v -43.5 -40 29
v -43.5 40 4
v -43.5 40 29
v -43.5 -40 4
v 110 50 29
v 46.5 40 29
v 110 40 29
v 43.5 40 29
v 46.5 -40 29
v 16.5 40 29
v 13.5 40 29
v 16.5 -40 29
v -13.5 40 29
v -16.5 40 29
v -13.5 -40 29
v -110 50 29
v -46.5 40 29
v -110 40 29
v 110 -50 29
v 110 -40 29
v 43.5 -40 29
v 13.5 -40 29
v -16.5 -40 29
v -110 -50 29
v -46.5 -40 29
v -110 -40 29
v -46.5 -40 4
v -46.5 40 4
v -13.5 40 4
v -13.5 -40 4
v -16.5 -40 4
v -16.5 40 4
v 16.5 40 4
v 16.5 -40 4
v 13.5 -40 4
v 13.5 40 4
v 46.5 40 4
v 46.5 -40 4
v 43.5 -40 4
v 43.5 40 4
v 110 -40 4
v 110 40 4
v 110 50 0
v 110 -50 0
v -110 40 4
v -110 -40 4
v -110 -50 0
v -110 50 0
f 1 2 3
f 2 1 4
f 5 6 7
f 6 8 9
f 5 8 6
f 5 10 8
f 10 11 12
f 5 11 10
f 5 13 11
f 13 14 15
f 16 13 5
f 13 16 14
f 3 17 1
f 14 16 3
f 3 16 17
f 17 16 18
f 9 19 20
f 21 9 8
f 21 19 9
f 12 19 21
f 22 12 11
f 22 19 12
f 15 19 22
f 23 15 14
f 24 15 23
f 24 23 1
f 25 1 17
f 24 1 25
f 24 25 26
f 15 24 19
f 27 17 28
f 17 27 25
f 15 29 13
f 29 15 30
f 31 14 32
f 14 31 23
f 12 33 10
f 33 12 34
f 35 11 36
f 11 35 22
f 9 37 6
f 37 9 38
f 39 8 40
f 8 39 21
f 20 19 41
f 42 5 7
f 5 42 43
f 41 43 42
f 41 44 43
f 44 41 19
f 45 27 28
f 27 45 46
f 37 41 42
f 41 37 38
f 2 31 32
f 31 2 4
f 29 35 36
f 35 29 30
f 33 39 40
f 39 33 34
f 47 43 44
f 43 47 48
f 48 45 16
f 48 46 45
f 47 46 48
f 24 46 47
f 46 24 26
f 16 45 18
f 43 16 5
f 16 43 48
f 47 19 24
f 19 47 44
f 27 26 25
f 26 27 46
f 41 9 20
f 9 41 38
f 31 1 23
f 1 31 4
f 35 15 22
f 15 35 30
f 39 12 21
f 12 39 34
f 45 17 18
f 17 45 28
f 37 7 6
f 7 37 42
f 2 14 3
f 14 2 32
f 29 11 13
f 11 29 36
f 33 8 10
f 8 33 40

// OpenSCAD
$fn = 32;

// ----------------------------------------------------------------------
// Rib frame 220 x 100 x 29
// 4 ribs at 30 mm pitch
// ----------------------------------------------------------------------

// --- parameters (mm) ---
frame = [220, 100, 4];  // base plate size (x, y, z)
rail_w = 10;            // side rail width
ribs = 4;               // number of ribs
rib_t = 3;              // rib thickness
rib_h = 25;             // rib height above the base plate
pitch = 30;             // pitch between rib centres

// --- derived feature positions (mm) ---
span = (ribs - 1) * pitch;          // = 90   distance between the outer ribs
origin_x = -span / 2;               // = -45   X of the first rib
rib_len = frame[1] - 2 * rail_w + 2;  // = 82   rib length, 1 mm into each rail
feature_centers = [
  [origin_x + 0 * pitch, 0],
  [origin_x + 1 * pitch, 0],
  [origin_x + 2 * pitch, 0],
  [origin_x + 3 * pitch, 0]
];   // rib centre line, drives the rib loop

// base plate, two side rails, then the ribs read straight off feature_centers
union() {
  translate([-frame[0] / 2, -frame[1] / 2, 0]) cube(frame);
  translate([-frame[0] / 2, -frame[1] / 2, 0]) cube([frame[0], rail_w, frame[2] + rib_h]);
  translate([-frame[0] / 2, frame[1] / 2 - rail_w, 0]) cube([frame[0], rail_w, frame[2] + rib_h]);
  for (centre = feature_centers)
    translate([centre[0] - rib_t / 2, centre[1] - rib_len / 2, frame[2] - 1])
      cube([rib_t, rib_len, rib_h + 1]);
}
